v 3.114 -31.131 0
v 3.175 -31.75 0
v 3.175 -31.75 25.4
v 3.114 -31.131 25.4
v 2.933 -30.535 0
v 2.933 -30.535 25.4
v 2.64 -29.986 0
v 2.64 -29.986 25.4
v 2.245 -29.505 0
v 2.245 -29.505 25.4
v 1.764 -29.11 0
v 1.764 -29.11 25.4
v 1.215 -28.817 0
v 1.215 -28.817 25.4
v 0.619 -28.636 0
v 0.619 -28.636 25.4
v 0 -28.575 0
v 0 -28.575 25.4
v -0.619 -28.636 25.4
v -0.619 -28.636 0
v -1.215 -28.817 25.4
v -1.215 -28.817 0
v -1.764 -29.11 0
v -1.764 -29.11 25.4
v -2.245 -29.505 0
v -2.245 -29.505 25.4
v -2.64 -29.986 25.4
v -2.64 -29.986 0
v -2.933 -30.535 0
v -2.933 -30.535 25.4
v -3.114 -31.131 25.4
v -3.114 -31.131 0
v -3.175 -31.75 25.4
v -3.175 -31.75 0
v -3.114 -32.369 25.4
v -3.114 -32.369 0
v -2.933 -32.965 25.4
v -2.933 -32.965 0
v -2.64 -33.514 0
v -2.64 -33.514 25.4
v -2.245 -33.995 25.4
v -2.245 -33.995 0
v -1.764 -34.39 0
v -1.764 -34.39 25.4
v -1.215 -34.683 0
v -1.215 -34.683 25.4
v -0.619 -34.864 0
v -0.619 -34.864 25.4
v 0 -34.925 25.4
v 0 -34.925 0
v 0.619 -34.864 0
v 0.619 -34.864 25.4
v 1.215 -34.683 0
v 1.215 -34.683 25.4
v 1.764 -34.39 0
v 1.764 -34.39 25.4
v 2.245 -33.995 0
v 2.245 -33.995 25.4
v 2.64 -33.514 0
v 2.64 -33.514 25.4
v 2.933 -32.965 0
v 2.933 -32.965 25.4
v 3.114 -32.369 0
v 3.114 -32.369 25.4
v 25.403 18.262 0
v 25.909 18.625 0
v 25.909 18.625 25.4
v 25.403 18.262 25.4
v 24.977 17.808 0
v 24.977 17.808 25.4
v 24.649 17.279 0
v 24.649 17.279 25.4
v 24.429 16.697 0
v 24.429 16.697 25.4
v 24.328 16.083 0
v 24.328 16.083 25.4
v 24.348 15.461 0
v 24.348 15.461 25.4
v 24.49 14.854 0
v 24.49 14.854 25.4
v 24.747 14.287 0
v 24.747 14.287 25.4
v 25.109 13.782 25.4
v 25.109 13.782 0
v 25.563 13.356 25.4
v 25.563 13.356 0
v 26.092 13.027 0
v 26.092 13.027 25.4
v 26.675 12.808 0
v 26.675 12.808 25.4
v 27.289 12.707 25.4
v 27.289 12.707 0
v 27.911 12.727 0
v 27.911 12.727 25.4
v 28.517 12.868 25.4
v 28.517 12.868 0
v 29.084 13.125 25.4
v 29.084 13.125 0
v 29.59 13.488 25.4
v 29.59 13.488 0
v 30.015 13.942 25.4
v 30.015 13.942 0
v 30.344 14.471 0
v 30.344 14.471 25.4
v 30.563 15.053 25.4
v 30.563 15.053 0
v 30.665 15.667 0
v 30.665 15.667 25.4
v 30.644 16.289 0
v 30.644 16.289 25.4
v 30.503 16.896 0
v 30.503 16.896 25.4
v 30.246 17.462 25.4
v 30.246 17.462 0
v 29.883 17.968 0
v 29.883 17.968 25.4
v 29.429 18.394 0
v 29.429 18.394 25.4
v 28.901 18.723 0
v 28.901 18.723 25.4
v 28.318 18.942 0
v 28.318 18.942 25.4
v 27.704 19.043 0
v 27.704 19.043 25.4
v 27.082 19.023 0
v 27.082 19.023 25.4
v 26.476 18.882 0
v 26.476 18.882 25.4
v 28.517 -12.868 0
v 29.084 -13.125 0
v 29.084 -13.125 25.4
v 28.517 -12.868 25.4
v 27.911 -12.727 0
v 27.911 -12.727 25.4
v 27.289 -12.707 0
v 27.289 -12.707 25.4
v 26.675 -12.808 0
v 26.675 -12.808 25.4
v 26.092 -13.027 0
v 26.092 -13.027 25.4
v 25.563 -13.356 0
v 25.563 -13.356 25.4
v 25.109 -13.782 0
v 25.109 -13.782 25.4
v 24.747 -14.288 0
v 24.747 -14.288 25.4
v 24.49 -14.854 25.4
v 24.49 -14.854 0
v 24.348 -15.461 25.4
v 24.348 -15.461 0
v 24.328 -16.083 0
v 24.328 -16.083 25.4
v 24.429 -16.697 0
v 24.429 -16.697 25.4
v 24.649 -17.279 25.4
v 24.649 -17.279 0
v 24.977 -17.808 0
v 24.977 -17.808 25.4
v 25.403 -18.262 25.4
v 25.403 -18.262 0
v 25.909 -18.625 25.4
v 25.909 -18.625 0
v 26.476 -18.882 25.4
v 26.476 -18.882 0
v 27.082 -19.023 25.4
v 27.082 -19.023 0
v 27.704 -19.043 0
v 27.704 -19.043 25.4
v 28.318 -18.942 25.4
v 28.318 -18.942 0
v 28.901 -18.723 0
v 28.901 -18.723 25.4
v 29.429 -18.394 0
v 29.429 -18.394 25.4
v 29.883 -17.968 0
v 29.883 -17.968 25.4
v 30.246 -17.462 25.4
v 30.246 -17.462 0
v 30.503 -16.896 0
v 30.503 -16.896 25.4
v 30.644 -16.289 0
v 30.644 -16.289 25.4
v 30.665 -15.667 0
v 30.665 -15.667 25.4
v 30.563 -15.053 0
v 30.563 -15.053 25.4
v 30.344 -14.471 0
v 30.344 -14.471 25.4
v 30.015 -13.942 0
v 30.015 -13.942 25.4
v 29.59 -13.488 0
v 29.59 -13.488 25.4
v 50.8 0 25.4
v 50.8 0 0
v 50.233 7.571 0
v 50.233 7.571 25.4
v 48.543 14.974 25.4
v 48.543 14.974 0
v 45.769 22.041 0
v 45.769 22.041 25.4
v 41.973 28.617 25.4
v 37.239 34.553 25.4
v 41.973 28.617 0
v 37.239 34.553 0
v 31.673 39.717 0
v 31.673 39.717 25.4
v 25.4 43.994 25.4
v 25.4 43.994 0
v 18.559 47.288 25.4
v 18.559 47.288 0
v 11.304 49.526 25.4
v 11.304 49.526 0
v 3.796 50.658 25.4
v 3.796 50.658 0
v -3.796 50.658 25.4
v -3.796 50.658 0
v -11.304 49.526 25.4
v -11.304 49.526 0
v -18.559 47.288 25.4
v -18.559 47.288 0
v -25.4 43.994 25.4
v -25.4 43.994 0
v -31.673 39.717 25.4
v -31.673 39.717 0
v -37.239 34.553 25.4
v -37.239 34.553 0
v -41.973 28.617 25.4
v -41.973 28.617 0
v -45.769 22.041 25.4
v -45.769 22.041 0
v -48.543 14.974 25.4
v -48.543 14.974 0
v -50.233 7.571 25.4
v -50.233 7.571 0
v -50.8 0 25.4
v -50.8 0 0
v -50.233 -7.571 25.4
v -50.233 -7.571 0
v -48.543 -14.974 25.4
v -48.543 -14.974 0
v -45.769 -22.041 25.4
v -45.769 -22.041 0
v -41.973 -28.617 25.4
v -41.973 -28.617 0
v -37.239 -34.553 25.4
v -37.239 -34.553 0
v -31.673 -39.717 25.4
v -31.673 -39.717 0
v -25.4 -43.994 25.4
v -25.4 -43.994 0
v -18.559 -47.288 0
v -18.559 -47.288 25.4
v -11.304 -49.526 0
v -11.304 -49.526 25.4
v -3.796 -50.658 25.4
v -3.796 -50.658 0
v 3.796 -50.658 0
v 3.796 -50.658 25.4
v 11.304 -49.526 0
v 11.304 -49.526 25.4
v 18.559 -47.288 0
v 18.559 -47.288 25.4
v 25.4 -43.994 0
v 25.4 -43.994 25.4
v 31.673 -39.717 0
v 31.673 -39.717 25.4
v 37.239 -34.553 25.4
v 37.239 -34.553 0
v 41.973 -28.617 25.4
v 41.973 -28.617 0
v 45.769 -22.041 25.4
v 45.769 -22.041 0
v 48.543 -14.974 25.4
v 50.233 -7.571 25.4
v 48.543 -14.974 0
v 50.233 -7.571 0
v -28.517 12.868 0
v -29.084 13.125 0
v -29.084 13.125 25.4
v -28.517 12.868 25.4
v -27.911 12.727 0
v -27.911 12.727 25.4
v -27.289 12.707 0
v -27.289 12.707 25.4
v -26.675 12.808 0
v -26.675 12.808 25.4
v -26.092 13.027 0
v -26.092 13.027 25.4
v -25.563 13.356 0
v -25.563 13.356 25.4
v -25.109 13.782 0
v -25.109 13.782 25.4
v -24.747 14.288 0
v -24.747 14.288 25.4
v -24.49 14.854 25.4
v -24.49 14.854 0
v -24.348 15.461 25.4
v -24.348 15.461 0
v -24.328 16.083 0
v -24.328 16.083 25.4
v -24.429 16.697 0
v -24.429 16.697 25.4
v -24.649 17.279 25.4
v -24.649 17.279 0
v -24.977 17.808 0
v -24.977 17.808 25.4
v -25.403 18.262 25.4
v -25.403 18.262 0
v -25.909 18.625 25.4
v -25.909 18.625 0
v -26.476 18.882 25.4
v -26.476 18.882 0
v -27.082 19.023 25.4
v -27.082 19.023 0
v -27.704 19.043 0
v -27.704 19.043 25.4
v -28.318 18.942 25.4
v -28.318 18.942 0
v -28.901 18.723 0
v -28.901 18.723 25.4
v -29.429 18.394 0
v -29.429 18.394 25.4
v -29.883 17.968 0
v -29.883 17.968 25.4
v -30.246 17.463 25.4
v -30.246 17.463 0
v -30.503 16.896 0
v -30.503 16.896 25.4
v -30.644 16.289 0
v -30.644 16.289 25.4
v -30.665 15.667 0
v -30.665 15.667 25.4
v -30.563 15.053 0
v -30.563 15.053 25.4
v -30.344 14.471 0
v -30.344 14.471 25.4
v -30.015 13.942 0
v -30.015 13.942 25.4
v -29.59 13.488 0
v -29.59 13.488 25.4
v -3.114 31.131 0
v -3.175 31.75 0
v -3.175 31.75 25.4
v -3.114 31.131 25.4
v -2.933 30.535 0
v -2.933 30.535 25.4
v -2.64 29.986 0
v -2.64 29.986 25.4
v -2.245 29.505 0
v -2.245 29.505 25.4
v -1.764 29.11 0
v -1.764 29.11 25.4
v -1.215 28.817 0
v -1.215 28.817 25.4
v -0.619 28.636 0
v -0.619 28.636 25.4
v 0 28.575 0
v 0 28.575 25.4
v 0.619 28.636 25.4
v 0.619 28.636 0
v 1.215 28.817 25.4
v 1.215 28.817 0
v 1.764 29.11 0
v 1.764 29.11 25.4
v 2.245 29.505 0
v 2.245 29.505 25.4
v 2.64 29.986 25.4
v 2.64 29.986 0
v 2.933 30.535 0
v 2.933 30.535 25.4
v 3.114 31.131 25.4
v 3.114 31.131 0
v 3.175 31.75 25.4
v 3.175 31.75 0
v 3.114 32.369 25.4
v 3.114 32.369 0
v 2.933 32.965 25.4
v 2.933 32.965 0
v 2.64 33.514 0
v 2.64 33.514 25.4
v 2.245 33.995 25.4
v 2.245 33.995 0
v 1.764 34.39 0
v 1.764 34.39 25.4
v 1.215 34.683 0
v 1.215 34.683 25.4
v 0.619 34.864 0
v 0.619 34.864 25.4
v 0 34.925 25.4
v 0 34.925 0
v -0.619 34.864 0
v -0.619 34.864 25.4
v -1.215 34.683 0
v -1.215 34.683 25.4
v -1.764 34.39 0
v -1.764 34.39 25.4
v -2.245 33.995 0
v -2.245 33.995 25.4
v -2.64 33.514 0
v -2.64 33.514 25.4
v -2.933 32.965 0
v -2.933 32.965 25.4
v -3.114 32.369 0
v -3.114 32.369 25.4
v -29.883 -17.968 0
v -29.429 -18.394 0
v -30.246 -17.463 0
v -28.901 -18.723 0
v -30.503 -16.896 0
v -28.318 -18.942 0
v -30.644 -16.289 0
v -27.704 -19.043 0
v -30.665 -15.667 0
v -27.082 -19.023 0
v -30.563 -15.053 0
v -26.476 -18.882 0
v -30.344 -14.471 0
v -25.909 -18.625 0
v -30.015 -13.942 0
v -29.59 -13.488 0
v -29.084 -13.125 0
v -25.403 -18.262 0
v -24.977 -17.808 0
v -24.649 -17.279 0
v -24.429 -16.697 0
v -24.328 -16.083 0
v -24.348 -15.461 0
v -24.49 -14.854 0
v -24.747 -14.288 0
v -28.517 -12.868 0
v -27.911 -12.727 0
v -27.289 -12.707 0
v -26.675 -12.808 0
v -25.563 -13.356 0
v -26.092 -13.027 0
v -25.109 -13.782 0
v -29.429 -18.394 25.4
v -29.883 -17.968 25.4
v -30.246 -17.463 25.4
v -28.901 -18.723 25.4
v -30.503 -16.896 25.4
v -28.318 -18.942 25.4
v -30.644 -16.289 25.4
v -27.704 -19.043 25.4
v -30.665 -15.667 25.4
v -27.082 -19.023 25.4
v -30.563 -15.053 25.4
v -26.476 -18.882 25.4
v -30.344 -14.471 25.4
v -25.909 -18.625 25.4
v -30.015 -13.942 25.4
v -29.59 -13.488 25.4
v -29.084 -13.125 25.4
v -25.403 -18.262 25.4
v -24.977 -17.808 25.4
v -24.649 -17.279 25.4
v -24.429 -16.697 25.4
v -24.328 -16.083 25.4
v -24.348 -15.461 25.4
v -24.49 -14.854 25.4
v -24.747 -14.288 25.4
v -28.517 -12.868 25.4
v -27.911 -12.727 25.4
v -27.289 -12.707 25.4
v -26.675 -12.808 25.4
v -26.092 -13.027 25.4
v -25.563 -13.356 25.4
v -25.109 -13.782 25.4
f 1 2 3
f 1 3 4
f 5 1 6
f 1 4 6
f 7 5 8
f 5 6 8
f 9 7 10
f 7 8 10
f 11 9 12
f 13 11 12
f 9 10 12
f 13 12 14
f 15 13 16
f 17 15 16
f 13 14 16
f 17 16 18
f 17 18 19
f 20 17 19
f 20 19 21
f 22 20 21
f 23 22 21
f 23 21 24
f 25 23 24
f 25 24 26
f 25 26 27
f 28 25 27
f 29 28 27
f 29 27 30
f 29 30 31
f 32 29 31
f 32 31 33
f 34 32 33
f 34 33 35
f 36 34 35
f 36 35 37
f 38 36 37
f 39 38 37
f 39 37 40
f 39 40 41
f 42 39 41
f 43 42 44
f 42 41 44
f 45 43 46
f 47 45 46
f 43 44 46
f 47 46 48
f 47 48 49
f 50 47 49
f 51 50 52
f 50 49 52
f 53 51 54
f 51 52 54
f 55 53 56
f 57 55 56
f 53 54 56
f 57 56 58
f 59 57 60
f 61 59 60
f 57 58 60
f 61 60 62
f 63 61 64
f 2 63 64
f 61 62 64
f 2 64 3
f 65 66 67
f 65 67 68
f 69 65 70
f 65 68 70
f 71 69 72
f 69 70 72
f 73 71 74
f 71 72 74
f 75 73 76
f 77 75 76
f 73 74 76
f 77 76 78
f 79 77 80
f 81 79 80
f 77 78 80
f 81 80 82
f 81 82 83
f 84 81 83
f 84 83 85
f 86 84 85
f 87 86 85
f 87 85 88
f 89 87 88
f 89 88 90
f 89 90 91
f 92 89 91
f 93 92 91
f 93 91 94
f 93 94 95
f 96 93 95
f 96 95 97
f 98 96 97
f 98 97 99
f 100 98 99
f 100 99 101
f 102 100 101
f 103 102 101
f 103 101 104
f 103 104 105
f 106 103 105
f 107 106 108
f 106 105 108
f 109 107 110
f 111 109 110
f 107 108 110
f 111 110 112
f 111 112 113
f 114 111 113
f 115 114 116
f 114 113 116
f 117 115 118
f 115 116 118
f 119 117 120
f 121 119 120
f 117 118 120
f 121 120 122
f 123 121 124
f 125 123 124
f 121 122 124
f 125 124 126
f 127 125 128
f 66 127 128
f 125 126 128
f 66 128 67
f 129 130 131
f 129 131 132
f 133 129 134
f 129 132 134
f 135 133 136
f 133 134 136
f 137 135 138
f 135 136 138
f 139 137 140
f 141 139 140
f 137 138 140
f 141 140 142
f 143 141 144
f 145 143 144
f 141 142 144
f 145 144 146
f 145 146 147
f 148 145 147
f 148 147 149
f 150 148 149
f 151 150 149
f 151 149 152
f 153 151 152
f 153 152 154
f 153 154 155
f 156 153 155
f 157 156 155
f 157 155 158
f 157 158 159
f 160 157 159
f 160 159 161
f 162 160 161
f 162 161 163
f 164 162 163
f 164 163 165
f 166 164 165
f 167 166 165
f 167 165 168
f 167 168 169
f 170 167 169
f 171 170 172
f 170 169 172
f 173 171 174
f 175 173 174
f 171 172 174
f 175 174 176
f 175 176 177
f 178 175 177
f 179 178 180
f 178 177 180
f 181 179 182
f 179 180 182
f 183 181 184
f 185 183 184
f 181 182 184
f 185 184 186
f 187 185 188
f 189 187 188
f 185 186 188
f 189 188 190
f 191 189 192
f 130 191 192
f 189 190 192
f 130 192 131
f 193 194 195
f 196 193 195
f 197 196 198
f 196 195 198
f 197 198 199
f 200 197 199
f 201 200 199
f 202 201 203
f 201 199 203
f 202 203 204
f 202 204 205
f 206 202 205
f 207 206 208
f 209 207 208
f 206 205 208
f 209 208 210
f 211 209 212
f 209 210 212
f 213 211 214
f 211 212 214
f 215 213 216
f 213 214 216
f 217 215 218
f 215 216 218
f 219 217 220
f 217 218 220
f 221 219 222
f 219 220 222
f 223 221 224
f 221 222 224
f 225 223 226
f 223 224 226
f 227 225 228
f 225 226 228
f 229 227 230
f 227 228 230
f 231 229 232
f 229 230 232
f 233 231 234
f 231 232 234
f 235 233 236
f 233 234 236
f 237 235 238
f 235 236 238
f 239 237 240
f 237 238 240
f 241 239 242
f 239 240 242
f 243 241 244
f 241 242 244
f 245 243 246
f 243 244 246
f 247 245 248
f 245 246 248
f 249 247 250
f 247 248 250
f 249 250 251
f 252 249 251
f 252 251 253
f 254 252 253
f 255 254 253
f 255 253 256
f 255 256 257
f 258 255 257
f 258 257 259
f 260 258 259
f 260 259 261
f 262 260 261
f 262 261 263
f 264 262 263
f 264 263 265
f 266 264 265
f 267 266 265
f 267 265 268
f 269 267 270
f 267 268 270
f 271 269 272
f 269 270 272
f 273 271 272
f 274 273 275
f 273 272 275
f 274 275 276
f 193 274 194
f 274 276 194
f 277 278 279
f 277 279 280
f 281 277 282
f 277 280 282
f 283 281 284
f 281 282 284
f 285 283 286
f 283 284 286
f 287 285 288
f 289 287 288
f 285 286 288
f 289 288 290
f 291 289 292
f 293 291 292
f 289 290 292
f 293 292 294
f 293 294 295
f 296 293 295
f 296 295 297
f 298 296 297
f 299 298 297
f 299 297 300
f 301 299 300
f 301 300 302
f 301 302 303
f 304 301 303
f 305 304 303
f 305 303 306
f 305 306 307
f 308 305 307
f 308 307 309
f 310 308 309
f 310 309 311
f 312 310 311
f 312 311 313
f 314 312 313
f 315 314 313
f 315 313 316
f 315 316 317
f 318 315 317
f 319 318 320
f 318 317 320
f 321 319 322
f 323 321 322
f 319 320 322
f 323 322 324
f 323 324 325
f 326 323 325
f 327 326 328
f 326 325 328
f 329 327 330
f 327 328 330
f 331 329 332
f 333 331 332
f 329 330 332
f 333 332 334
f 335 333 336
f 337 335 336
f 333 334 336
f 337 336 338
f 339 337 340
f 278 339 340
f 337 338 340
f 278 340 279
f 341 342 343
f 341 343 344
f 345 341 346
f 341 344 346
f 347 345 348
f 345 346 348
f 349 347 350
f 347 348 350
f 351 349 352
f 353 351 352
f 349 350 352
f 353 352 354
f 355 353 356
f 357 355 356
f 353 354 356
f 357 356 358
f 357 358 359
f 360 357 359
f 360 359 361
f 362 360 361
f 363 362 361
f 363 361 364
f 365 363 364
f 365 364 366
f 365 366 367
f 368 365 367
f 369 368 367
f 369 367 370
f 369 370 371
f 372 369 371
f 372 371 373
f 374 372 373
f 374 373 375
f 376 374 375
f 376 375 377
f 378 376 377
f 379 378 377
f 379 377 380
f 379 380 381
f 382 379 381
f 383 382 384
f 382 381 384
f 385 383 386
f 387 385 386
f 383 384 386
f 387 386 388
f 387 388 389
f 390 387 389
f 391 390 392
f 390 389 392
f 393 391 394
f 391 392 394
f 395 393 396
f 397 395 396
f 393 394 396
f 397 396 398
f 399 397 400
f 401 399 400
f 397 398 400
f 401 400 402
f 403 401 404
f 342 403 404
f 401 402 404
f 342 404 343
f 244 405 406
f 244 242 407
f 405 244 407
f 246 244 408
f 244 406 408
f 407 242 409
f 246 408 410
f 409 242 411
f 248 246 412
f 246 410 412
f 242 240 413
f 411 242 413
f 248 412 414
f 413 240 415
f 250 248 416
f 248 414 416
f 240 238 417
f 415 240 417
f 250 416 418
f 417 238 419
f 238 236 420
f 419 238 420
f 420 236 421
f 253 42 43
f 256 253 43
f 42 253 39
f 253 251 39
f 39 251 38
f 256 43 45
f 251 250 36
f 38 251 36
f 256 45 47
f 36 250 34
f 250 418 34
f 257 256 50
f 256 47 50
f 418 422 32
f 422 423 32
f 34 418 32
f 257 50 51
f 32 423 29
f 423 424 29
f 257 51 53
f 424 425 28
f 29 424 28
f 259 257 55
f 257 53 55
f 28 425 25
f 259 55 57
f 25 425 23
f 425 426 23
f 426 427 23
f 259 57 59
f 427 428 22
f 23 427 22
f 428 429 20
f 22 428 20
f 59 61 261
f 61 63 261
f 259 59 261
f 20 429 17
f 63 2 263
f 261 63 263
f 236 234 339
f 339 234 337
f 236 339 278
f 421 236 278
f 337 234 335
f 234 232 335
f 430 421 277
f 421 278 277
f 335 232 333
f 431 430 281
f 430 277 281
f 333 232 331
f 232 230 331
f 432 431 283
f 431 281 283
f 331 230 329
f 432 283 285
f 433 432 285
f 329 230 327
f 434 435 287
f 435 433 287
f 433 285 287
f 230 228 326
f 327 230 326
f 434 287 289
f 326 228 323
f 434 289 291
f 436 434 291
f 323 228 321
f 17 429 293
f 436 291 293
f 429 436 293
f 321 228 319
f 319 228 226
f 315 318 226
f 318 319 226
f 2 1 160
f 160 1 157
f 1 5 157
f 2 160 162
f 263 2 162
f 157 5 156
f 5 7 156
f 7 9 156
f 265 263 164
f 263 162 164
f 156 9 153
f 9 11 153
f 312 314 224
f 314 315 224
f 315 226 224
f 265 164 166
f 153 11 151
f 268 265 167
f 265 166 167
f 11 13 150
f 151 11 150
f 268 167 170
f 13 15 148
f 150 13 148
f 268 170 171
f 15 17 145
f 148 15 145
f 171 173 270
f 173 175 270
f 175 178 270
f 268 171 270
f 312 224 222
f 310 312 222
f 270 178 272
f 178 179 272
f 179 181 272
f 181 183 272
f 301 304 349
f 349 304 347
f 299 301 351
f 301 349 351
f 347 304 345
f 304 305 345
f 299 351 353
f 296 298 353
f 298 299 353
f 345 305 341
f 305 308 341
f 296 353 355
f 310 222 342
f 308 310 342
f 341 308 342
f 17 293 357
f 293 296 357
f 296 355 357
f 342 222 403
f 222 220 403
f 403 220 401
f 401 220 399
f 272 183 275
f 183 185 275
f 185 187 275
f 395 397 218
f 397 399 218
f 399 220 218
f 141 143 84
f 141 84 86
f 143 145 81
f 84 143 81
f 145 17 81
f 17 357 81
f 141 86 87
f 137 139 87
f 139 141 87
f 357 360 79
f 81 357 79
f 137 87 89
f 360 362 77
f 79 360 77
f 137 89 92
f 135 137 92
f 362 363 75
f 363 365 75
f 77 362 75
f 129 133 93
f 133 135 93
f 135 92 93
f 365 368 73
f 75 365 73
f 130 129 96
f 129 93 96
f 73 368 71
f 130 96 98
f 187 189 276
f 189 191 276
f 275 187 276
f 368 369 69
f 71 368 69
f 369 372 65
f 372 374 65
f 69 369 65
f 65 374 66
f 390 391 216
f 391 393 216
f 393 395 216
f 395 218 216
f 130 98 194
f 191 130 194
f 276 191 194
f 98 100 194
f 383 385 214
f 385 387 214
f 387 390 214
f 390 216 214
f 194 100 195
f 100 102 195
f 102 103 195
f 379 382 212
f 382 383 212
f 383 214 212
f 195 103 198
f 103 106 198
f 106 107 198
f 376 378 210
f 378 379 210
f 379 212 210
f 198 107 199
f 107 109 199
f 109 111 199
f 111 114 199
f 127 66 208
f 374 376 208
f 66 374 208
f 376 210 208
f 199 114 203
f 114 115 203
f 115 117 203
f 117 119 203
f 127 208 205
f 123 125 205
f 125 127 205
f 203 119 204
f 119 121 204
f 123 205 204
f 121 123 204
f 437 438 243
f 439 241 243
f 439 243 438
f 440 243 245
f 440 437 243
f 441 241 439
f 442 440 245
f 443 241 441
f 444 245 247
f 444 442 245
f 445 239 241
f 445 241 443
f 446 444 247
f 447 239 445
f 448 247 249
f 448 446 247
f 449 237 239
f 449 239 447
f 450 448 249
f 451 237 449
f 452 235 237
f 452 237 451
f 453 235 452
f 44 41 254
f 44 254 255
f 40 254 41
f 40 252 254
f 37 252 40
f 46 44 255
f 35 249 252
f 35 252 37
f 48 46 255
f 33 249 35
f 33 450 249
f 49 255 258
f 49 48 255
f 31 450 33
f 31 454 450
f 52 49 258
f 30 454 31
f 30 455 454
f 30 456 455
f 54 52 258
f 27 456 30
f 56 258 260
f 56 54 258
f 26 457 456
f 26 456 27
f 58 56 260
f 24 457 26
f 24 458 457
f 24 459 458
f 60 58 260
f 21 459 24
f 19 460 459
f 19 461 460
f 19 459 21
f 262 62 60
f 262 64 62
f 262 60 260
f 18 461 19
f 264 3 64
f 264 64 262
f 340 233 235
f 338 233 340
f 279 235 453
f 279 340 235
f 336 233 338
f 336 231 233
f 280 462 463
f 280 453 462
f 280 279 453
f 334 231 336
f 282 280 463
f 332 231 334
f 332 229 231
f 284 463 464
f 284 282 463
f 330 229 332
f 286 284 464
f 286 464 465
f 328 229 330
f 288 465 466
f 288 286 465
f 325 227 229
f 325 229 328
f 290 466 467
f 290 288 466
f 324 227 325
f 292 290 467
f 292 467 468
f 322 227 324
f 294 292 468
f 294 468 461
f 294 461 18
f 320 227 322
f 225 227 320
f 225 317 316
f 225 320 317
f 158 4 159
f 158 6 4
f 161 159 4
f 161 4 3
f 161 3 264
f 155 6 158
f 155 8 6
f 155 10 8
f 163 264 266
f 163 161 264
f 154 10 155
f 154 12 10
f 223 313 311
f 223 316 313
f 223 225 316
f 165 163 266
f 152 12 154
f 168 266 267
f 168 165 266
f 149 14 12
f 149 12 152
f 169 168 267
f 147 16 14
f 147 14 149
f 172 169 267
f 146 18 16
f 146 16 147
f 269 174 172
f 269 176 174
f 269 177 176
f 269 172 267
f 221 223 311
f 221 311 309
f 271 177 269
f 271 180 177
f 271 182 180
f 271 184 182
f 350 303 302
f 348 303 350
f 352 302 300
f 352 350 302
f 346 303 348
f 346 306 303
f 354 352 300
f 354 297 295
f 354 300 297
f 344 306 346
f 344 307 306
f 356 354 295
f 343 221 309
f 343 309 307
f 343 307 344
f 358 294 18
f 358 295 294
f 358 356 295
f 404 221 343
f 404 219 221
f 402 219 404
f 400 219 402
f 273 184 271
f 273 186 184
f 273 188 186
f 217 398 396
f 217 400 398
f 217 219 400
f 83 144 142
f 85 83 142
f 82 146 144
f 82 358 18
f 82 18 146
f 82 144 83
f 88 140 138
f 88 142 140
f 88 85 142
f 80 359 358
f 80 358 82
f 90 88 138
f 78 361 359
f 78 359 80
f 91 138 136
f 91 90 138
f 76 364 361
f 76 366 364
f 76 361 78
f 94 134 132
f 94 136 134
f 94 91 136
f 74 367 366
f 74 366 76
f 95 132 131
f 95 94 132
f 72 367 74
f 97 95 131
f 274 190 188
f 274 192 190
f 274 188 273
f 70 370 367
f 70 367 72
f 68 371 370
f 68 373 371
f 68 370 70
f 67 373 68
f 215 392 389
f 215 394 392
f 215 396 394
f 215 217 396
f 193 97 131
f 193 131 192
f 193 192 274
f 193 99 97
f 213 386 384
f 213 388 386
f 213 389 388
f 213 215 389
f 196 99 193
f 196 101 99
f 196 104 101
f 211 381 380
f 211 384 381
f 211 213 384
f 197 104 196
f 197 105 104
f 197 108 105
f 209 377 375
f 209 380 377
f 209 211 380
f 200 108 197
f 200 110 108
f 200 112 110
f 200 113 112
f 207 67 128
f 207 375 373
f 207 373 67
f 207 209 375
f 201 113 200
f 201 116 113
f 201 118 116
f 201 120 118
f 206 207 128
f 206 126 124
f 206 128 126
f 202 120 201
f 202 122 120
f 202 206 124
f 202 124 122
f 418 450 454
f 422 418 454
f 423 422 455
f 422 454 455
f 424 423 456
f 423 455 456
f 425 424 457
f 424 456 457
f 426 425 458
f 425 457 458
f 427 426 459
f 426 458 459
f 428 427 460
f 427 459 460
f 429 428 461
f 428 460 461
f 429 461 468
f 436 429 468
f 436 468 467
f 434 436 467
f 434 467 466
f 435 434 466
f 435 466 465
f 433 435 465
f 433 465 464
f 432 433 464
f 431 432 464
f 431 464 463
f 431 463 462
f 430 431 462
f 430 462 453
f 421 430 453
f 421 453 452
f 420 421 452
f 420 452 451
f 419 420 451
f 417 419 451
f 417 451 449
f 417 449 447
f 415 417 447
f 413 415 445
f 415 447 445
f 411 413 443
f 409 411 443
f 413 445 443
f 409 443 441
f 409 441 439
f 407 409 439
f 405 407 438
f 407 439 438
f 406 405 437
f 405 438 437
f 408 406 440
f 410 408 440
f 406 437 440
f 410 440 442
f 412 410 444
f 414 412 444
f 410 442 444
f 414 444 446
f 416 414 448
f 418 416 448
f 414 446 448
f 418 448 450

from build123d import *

# Parameters (mm, degrees)
F0_R            = 50.8
F1_DEPTH        = 25.4
F2_R            = 3.175
F3_DEPTH        = 25.401
F3_COPIES_COUNT = 6


# Not quite as in the source:
# - a pattern or mirror of a feature is missing from the dataset's text; its kind, count and spacing are read off the source's solid


with BuildPart() as f1:
    # F0 (on Top) → F1 (new body)
    with BuildSketch(Plane.XY):
        Circle(F0_R)
    extrude(amount=F1_DEPTH)

    # F2 (on face) → F3 (cut, through all)
    with BuildSketch(Plane.XY.offset(25.4)):
        with Locations((0, -31.75)):
            Circle(F2_R)
    f3 = extrude(amount=-F3_DEPTH, mode=Mode.SUBTRACT)

    # F3_copies: F3 ×6 about axis
    f3_copies_axis = Axis((0, 0, 0), (0, 0, 1))
    for i in range(1, F3_COPIES_COUNT):
        add(f3.rotate(f3_copies_axis, i * 360 / F3_COPIES_COUNT), mode=Mode.SUBTRACT)


solid = f1.part
